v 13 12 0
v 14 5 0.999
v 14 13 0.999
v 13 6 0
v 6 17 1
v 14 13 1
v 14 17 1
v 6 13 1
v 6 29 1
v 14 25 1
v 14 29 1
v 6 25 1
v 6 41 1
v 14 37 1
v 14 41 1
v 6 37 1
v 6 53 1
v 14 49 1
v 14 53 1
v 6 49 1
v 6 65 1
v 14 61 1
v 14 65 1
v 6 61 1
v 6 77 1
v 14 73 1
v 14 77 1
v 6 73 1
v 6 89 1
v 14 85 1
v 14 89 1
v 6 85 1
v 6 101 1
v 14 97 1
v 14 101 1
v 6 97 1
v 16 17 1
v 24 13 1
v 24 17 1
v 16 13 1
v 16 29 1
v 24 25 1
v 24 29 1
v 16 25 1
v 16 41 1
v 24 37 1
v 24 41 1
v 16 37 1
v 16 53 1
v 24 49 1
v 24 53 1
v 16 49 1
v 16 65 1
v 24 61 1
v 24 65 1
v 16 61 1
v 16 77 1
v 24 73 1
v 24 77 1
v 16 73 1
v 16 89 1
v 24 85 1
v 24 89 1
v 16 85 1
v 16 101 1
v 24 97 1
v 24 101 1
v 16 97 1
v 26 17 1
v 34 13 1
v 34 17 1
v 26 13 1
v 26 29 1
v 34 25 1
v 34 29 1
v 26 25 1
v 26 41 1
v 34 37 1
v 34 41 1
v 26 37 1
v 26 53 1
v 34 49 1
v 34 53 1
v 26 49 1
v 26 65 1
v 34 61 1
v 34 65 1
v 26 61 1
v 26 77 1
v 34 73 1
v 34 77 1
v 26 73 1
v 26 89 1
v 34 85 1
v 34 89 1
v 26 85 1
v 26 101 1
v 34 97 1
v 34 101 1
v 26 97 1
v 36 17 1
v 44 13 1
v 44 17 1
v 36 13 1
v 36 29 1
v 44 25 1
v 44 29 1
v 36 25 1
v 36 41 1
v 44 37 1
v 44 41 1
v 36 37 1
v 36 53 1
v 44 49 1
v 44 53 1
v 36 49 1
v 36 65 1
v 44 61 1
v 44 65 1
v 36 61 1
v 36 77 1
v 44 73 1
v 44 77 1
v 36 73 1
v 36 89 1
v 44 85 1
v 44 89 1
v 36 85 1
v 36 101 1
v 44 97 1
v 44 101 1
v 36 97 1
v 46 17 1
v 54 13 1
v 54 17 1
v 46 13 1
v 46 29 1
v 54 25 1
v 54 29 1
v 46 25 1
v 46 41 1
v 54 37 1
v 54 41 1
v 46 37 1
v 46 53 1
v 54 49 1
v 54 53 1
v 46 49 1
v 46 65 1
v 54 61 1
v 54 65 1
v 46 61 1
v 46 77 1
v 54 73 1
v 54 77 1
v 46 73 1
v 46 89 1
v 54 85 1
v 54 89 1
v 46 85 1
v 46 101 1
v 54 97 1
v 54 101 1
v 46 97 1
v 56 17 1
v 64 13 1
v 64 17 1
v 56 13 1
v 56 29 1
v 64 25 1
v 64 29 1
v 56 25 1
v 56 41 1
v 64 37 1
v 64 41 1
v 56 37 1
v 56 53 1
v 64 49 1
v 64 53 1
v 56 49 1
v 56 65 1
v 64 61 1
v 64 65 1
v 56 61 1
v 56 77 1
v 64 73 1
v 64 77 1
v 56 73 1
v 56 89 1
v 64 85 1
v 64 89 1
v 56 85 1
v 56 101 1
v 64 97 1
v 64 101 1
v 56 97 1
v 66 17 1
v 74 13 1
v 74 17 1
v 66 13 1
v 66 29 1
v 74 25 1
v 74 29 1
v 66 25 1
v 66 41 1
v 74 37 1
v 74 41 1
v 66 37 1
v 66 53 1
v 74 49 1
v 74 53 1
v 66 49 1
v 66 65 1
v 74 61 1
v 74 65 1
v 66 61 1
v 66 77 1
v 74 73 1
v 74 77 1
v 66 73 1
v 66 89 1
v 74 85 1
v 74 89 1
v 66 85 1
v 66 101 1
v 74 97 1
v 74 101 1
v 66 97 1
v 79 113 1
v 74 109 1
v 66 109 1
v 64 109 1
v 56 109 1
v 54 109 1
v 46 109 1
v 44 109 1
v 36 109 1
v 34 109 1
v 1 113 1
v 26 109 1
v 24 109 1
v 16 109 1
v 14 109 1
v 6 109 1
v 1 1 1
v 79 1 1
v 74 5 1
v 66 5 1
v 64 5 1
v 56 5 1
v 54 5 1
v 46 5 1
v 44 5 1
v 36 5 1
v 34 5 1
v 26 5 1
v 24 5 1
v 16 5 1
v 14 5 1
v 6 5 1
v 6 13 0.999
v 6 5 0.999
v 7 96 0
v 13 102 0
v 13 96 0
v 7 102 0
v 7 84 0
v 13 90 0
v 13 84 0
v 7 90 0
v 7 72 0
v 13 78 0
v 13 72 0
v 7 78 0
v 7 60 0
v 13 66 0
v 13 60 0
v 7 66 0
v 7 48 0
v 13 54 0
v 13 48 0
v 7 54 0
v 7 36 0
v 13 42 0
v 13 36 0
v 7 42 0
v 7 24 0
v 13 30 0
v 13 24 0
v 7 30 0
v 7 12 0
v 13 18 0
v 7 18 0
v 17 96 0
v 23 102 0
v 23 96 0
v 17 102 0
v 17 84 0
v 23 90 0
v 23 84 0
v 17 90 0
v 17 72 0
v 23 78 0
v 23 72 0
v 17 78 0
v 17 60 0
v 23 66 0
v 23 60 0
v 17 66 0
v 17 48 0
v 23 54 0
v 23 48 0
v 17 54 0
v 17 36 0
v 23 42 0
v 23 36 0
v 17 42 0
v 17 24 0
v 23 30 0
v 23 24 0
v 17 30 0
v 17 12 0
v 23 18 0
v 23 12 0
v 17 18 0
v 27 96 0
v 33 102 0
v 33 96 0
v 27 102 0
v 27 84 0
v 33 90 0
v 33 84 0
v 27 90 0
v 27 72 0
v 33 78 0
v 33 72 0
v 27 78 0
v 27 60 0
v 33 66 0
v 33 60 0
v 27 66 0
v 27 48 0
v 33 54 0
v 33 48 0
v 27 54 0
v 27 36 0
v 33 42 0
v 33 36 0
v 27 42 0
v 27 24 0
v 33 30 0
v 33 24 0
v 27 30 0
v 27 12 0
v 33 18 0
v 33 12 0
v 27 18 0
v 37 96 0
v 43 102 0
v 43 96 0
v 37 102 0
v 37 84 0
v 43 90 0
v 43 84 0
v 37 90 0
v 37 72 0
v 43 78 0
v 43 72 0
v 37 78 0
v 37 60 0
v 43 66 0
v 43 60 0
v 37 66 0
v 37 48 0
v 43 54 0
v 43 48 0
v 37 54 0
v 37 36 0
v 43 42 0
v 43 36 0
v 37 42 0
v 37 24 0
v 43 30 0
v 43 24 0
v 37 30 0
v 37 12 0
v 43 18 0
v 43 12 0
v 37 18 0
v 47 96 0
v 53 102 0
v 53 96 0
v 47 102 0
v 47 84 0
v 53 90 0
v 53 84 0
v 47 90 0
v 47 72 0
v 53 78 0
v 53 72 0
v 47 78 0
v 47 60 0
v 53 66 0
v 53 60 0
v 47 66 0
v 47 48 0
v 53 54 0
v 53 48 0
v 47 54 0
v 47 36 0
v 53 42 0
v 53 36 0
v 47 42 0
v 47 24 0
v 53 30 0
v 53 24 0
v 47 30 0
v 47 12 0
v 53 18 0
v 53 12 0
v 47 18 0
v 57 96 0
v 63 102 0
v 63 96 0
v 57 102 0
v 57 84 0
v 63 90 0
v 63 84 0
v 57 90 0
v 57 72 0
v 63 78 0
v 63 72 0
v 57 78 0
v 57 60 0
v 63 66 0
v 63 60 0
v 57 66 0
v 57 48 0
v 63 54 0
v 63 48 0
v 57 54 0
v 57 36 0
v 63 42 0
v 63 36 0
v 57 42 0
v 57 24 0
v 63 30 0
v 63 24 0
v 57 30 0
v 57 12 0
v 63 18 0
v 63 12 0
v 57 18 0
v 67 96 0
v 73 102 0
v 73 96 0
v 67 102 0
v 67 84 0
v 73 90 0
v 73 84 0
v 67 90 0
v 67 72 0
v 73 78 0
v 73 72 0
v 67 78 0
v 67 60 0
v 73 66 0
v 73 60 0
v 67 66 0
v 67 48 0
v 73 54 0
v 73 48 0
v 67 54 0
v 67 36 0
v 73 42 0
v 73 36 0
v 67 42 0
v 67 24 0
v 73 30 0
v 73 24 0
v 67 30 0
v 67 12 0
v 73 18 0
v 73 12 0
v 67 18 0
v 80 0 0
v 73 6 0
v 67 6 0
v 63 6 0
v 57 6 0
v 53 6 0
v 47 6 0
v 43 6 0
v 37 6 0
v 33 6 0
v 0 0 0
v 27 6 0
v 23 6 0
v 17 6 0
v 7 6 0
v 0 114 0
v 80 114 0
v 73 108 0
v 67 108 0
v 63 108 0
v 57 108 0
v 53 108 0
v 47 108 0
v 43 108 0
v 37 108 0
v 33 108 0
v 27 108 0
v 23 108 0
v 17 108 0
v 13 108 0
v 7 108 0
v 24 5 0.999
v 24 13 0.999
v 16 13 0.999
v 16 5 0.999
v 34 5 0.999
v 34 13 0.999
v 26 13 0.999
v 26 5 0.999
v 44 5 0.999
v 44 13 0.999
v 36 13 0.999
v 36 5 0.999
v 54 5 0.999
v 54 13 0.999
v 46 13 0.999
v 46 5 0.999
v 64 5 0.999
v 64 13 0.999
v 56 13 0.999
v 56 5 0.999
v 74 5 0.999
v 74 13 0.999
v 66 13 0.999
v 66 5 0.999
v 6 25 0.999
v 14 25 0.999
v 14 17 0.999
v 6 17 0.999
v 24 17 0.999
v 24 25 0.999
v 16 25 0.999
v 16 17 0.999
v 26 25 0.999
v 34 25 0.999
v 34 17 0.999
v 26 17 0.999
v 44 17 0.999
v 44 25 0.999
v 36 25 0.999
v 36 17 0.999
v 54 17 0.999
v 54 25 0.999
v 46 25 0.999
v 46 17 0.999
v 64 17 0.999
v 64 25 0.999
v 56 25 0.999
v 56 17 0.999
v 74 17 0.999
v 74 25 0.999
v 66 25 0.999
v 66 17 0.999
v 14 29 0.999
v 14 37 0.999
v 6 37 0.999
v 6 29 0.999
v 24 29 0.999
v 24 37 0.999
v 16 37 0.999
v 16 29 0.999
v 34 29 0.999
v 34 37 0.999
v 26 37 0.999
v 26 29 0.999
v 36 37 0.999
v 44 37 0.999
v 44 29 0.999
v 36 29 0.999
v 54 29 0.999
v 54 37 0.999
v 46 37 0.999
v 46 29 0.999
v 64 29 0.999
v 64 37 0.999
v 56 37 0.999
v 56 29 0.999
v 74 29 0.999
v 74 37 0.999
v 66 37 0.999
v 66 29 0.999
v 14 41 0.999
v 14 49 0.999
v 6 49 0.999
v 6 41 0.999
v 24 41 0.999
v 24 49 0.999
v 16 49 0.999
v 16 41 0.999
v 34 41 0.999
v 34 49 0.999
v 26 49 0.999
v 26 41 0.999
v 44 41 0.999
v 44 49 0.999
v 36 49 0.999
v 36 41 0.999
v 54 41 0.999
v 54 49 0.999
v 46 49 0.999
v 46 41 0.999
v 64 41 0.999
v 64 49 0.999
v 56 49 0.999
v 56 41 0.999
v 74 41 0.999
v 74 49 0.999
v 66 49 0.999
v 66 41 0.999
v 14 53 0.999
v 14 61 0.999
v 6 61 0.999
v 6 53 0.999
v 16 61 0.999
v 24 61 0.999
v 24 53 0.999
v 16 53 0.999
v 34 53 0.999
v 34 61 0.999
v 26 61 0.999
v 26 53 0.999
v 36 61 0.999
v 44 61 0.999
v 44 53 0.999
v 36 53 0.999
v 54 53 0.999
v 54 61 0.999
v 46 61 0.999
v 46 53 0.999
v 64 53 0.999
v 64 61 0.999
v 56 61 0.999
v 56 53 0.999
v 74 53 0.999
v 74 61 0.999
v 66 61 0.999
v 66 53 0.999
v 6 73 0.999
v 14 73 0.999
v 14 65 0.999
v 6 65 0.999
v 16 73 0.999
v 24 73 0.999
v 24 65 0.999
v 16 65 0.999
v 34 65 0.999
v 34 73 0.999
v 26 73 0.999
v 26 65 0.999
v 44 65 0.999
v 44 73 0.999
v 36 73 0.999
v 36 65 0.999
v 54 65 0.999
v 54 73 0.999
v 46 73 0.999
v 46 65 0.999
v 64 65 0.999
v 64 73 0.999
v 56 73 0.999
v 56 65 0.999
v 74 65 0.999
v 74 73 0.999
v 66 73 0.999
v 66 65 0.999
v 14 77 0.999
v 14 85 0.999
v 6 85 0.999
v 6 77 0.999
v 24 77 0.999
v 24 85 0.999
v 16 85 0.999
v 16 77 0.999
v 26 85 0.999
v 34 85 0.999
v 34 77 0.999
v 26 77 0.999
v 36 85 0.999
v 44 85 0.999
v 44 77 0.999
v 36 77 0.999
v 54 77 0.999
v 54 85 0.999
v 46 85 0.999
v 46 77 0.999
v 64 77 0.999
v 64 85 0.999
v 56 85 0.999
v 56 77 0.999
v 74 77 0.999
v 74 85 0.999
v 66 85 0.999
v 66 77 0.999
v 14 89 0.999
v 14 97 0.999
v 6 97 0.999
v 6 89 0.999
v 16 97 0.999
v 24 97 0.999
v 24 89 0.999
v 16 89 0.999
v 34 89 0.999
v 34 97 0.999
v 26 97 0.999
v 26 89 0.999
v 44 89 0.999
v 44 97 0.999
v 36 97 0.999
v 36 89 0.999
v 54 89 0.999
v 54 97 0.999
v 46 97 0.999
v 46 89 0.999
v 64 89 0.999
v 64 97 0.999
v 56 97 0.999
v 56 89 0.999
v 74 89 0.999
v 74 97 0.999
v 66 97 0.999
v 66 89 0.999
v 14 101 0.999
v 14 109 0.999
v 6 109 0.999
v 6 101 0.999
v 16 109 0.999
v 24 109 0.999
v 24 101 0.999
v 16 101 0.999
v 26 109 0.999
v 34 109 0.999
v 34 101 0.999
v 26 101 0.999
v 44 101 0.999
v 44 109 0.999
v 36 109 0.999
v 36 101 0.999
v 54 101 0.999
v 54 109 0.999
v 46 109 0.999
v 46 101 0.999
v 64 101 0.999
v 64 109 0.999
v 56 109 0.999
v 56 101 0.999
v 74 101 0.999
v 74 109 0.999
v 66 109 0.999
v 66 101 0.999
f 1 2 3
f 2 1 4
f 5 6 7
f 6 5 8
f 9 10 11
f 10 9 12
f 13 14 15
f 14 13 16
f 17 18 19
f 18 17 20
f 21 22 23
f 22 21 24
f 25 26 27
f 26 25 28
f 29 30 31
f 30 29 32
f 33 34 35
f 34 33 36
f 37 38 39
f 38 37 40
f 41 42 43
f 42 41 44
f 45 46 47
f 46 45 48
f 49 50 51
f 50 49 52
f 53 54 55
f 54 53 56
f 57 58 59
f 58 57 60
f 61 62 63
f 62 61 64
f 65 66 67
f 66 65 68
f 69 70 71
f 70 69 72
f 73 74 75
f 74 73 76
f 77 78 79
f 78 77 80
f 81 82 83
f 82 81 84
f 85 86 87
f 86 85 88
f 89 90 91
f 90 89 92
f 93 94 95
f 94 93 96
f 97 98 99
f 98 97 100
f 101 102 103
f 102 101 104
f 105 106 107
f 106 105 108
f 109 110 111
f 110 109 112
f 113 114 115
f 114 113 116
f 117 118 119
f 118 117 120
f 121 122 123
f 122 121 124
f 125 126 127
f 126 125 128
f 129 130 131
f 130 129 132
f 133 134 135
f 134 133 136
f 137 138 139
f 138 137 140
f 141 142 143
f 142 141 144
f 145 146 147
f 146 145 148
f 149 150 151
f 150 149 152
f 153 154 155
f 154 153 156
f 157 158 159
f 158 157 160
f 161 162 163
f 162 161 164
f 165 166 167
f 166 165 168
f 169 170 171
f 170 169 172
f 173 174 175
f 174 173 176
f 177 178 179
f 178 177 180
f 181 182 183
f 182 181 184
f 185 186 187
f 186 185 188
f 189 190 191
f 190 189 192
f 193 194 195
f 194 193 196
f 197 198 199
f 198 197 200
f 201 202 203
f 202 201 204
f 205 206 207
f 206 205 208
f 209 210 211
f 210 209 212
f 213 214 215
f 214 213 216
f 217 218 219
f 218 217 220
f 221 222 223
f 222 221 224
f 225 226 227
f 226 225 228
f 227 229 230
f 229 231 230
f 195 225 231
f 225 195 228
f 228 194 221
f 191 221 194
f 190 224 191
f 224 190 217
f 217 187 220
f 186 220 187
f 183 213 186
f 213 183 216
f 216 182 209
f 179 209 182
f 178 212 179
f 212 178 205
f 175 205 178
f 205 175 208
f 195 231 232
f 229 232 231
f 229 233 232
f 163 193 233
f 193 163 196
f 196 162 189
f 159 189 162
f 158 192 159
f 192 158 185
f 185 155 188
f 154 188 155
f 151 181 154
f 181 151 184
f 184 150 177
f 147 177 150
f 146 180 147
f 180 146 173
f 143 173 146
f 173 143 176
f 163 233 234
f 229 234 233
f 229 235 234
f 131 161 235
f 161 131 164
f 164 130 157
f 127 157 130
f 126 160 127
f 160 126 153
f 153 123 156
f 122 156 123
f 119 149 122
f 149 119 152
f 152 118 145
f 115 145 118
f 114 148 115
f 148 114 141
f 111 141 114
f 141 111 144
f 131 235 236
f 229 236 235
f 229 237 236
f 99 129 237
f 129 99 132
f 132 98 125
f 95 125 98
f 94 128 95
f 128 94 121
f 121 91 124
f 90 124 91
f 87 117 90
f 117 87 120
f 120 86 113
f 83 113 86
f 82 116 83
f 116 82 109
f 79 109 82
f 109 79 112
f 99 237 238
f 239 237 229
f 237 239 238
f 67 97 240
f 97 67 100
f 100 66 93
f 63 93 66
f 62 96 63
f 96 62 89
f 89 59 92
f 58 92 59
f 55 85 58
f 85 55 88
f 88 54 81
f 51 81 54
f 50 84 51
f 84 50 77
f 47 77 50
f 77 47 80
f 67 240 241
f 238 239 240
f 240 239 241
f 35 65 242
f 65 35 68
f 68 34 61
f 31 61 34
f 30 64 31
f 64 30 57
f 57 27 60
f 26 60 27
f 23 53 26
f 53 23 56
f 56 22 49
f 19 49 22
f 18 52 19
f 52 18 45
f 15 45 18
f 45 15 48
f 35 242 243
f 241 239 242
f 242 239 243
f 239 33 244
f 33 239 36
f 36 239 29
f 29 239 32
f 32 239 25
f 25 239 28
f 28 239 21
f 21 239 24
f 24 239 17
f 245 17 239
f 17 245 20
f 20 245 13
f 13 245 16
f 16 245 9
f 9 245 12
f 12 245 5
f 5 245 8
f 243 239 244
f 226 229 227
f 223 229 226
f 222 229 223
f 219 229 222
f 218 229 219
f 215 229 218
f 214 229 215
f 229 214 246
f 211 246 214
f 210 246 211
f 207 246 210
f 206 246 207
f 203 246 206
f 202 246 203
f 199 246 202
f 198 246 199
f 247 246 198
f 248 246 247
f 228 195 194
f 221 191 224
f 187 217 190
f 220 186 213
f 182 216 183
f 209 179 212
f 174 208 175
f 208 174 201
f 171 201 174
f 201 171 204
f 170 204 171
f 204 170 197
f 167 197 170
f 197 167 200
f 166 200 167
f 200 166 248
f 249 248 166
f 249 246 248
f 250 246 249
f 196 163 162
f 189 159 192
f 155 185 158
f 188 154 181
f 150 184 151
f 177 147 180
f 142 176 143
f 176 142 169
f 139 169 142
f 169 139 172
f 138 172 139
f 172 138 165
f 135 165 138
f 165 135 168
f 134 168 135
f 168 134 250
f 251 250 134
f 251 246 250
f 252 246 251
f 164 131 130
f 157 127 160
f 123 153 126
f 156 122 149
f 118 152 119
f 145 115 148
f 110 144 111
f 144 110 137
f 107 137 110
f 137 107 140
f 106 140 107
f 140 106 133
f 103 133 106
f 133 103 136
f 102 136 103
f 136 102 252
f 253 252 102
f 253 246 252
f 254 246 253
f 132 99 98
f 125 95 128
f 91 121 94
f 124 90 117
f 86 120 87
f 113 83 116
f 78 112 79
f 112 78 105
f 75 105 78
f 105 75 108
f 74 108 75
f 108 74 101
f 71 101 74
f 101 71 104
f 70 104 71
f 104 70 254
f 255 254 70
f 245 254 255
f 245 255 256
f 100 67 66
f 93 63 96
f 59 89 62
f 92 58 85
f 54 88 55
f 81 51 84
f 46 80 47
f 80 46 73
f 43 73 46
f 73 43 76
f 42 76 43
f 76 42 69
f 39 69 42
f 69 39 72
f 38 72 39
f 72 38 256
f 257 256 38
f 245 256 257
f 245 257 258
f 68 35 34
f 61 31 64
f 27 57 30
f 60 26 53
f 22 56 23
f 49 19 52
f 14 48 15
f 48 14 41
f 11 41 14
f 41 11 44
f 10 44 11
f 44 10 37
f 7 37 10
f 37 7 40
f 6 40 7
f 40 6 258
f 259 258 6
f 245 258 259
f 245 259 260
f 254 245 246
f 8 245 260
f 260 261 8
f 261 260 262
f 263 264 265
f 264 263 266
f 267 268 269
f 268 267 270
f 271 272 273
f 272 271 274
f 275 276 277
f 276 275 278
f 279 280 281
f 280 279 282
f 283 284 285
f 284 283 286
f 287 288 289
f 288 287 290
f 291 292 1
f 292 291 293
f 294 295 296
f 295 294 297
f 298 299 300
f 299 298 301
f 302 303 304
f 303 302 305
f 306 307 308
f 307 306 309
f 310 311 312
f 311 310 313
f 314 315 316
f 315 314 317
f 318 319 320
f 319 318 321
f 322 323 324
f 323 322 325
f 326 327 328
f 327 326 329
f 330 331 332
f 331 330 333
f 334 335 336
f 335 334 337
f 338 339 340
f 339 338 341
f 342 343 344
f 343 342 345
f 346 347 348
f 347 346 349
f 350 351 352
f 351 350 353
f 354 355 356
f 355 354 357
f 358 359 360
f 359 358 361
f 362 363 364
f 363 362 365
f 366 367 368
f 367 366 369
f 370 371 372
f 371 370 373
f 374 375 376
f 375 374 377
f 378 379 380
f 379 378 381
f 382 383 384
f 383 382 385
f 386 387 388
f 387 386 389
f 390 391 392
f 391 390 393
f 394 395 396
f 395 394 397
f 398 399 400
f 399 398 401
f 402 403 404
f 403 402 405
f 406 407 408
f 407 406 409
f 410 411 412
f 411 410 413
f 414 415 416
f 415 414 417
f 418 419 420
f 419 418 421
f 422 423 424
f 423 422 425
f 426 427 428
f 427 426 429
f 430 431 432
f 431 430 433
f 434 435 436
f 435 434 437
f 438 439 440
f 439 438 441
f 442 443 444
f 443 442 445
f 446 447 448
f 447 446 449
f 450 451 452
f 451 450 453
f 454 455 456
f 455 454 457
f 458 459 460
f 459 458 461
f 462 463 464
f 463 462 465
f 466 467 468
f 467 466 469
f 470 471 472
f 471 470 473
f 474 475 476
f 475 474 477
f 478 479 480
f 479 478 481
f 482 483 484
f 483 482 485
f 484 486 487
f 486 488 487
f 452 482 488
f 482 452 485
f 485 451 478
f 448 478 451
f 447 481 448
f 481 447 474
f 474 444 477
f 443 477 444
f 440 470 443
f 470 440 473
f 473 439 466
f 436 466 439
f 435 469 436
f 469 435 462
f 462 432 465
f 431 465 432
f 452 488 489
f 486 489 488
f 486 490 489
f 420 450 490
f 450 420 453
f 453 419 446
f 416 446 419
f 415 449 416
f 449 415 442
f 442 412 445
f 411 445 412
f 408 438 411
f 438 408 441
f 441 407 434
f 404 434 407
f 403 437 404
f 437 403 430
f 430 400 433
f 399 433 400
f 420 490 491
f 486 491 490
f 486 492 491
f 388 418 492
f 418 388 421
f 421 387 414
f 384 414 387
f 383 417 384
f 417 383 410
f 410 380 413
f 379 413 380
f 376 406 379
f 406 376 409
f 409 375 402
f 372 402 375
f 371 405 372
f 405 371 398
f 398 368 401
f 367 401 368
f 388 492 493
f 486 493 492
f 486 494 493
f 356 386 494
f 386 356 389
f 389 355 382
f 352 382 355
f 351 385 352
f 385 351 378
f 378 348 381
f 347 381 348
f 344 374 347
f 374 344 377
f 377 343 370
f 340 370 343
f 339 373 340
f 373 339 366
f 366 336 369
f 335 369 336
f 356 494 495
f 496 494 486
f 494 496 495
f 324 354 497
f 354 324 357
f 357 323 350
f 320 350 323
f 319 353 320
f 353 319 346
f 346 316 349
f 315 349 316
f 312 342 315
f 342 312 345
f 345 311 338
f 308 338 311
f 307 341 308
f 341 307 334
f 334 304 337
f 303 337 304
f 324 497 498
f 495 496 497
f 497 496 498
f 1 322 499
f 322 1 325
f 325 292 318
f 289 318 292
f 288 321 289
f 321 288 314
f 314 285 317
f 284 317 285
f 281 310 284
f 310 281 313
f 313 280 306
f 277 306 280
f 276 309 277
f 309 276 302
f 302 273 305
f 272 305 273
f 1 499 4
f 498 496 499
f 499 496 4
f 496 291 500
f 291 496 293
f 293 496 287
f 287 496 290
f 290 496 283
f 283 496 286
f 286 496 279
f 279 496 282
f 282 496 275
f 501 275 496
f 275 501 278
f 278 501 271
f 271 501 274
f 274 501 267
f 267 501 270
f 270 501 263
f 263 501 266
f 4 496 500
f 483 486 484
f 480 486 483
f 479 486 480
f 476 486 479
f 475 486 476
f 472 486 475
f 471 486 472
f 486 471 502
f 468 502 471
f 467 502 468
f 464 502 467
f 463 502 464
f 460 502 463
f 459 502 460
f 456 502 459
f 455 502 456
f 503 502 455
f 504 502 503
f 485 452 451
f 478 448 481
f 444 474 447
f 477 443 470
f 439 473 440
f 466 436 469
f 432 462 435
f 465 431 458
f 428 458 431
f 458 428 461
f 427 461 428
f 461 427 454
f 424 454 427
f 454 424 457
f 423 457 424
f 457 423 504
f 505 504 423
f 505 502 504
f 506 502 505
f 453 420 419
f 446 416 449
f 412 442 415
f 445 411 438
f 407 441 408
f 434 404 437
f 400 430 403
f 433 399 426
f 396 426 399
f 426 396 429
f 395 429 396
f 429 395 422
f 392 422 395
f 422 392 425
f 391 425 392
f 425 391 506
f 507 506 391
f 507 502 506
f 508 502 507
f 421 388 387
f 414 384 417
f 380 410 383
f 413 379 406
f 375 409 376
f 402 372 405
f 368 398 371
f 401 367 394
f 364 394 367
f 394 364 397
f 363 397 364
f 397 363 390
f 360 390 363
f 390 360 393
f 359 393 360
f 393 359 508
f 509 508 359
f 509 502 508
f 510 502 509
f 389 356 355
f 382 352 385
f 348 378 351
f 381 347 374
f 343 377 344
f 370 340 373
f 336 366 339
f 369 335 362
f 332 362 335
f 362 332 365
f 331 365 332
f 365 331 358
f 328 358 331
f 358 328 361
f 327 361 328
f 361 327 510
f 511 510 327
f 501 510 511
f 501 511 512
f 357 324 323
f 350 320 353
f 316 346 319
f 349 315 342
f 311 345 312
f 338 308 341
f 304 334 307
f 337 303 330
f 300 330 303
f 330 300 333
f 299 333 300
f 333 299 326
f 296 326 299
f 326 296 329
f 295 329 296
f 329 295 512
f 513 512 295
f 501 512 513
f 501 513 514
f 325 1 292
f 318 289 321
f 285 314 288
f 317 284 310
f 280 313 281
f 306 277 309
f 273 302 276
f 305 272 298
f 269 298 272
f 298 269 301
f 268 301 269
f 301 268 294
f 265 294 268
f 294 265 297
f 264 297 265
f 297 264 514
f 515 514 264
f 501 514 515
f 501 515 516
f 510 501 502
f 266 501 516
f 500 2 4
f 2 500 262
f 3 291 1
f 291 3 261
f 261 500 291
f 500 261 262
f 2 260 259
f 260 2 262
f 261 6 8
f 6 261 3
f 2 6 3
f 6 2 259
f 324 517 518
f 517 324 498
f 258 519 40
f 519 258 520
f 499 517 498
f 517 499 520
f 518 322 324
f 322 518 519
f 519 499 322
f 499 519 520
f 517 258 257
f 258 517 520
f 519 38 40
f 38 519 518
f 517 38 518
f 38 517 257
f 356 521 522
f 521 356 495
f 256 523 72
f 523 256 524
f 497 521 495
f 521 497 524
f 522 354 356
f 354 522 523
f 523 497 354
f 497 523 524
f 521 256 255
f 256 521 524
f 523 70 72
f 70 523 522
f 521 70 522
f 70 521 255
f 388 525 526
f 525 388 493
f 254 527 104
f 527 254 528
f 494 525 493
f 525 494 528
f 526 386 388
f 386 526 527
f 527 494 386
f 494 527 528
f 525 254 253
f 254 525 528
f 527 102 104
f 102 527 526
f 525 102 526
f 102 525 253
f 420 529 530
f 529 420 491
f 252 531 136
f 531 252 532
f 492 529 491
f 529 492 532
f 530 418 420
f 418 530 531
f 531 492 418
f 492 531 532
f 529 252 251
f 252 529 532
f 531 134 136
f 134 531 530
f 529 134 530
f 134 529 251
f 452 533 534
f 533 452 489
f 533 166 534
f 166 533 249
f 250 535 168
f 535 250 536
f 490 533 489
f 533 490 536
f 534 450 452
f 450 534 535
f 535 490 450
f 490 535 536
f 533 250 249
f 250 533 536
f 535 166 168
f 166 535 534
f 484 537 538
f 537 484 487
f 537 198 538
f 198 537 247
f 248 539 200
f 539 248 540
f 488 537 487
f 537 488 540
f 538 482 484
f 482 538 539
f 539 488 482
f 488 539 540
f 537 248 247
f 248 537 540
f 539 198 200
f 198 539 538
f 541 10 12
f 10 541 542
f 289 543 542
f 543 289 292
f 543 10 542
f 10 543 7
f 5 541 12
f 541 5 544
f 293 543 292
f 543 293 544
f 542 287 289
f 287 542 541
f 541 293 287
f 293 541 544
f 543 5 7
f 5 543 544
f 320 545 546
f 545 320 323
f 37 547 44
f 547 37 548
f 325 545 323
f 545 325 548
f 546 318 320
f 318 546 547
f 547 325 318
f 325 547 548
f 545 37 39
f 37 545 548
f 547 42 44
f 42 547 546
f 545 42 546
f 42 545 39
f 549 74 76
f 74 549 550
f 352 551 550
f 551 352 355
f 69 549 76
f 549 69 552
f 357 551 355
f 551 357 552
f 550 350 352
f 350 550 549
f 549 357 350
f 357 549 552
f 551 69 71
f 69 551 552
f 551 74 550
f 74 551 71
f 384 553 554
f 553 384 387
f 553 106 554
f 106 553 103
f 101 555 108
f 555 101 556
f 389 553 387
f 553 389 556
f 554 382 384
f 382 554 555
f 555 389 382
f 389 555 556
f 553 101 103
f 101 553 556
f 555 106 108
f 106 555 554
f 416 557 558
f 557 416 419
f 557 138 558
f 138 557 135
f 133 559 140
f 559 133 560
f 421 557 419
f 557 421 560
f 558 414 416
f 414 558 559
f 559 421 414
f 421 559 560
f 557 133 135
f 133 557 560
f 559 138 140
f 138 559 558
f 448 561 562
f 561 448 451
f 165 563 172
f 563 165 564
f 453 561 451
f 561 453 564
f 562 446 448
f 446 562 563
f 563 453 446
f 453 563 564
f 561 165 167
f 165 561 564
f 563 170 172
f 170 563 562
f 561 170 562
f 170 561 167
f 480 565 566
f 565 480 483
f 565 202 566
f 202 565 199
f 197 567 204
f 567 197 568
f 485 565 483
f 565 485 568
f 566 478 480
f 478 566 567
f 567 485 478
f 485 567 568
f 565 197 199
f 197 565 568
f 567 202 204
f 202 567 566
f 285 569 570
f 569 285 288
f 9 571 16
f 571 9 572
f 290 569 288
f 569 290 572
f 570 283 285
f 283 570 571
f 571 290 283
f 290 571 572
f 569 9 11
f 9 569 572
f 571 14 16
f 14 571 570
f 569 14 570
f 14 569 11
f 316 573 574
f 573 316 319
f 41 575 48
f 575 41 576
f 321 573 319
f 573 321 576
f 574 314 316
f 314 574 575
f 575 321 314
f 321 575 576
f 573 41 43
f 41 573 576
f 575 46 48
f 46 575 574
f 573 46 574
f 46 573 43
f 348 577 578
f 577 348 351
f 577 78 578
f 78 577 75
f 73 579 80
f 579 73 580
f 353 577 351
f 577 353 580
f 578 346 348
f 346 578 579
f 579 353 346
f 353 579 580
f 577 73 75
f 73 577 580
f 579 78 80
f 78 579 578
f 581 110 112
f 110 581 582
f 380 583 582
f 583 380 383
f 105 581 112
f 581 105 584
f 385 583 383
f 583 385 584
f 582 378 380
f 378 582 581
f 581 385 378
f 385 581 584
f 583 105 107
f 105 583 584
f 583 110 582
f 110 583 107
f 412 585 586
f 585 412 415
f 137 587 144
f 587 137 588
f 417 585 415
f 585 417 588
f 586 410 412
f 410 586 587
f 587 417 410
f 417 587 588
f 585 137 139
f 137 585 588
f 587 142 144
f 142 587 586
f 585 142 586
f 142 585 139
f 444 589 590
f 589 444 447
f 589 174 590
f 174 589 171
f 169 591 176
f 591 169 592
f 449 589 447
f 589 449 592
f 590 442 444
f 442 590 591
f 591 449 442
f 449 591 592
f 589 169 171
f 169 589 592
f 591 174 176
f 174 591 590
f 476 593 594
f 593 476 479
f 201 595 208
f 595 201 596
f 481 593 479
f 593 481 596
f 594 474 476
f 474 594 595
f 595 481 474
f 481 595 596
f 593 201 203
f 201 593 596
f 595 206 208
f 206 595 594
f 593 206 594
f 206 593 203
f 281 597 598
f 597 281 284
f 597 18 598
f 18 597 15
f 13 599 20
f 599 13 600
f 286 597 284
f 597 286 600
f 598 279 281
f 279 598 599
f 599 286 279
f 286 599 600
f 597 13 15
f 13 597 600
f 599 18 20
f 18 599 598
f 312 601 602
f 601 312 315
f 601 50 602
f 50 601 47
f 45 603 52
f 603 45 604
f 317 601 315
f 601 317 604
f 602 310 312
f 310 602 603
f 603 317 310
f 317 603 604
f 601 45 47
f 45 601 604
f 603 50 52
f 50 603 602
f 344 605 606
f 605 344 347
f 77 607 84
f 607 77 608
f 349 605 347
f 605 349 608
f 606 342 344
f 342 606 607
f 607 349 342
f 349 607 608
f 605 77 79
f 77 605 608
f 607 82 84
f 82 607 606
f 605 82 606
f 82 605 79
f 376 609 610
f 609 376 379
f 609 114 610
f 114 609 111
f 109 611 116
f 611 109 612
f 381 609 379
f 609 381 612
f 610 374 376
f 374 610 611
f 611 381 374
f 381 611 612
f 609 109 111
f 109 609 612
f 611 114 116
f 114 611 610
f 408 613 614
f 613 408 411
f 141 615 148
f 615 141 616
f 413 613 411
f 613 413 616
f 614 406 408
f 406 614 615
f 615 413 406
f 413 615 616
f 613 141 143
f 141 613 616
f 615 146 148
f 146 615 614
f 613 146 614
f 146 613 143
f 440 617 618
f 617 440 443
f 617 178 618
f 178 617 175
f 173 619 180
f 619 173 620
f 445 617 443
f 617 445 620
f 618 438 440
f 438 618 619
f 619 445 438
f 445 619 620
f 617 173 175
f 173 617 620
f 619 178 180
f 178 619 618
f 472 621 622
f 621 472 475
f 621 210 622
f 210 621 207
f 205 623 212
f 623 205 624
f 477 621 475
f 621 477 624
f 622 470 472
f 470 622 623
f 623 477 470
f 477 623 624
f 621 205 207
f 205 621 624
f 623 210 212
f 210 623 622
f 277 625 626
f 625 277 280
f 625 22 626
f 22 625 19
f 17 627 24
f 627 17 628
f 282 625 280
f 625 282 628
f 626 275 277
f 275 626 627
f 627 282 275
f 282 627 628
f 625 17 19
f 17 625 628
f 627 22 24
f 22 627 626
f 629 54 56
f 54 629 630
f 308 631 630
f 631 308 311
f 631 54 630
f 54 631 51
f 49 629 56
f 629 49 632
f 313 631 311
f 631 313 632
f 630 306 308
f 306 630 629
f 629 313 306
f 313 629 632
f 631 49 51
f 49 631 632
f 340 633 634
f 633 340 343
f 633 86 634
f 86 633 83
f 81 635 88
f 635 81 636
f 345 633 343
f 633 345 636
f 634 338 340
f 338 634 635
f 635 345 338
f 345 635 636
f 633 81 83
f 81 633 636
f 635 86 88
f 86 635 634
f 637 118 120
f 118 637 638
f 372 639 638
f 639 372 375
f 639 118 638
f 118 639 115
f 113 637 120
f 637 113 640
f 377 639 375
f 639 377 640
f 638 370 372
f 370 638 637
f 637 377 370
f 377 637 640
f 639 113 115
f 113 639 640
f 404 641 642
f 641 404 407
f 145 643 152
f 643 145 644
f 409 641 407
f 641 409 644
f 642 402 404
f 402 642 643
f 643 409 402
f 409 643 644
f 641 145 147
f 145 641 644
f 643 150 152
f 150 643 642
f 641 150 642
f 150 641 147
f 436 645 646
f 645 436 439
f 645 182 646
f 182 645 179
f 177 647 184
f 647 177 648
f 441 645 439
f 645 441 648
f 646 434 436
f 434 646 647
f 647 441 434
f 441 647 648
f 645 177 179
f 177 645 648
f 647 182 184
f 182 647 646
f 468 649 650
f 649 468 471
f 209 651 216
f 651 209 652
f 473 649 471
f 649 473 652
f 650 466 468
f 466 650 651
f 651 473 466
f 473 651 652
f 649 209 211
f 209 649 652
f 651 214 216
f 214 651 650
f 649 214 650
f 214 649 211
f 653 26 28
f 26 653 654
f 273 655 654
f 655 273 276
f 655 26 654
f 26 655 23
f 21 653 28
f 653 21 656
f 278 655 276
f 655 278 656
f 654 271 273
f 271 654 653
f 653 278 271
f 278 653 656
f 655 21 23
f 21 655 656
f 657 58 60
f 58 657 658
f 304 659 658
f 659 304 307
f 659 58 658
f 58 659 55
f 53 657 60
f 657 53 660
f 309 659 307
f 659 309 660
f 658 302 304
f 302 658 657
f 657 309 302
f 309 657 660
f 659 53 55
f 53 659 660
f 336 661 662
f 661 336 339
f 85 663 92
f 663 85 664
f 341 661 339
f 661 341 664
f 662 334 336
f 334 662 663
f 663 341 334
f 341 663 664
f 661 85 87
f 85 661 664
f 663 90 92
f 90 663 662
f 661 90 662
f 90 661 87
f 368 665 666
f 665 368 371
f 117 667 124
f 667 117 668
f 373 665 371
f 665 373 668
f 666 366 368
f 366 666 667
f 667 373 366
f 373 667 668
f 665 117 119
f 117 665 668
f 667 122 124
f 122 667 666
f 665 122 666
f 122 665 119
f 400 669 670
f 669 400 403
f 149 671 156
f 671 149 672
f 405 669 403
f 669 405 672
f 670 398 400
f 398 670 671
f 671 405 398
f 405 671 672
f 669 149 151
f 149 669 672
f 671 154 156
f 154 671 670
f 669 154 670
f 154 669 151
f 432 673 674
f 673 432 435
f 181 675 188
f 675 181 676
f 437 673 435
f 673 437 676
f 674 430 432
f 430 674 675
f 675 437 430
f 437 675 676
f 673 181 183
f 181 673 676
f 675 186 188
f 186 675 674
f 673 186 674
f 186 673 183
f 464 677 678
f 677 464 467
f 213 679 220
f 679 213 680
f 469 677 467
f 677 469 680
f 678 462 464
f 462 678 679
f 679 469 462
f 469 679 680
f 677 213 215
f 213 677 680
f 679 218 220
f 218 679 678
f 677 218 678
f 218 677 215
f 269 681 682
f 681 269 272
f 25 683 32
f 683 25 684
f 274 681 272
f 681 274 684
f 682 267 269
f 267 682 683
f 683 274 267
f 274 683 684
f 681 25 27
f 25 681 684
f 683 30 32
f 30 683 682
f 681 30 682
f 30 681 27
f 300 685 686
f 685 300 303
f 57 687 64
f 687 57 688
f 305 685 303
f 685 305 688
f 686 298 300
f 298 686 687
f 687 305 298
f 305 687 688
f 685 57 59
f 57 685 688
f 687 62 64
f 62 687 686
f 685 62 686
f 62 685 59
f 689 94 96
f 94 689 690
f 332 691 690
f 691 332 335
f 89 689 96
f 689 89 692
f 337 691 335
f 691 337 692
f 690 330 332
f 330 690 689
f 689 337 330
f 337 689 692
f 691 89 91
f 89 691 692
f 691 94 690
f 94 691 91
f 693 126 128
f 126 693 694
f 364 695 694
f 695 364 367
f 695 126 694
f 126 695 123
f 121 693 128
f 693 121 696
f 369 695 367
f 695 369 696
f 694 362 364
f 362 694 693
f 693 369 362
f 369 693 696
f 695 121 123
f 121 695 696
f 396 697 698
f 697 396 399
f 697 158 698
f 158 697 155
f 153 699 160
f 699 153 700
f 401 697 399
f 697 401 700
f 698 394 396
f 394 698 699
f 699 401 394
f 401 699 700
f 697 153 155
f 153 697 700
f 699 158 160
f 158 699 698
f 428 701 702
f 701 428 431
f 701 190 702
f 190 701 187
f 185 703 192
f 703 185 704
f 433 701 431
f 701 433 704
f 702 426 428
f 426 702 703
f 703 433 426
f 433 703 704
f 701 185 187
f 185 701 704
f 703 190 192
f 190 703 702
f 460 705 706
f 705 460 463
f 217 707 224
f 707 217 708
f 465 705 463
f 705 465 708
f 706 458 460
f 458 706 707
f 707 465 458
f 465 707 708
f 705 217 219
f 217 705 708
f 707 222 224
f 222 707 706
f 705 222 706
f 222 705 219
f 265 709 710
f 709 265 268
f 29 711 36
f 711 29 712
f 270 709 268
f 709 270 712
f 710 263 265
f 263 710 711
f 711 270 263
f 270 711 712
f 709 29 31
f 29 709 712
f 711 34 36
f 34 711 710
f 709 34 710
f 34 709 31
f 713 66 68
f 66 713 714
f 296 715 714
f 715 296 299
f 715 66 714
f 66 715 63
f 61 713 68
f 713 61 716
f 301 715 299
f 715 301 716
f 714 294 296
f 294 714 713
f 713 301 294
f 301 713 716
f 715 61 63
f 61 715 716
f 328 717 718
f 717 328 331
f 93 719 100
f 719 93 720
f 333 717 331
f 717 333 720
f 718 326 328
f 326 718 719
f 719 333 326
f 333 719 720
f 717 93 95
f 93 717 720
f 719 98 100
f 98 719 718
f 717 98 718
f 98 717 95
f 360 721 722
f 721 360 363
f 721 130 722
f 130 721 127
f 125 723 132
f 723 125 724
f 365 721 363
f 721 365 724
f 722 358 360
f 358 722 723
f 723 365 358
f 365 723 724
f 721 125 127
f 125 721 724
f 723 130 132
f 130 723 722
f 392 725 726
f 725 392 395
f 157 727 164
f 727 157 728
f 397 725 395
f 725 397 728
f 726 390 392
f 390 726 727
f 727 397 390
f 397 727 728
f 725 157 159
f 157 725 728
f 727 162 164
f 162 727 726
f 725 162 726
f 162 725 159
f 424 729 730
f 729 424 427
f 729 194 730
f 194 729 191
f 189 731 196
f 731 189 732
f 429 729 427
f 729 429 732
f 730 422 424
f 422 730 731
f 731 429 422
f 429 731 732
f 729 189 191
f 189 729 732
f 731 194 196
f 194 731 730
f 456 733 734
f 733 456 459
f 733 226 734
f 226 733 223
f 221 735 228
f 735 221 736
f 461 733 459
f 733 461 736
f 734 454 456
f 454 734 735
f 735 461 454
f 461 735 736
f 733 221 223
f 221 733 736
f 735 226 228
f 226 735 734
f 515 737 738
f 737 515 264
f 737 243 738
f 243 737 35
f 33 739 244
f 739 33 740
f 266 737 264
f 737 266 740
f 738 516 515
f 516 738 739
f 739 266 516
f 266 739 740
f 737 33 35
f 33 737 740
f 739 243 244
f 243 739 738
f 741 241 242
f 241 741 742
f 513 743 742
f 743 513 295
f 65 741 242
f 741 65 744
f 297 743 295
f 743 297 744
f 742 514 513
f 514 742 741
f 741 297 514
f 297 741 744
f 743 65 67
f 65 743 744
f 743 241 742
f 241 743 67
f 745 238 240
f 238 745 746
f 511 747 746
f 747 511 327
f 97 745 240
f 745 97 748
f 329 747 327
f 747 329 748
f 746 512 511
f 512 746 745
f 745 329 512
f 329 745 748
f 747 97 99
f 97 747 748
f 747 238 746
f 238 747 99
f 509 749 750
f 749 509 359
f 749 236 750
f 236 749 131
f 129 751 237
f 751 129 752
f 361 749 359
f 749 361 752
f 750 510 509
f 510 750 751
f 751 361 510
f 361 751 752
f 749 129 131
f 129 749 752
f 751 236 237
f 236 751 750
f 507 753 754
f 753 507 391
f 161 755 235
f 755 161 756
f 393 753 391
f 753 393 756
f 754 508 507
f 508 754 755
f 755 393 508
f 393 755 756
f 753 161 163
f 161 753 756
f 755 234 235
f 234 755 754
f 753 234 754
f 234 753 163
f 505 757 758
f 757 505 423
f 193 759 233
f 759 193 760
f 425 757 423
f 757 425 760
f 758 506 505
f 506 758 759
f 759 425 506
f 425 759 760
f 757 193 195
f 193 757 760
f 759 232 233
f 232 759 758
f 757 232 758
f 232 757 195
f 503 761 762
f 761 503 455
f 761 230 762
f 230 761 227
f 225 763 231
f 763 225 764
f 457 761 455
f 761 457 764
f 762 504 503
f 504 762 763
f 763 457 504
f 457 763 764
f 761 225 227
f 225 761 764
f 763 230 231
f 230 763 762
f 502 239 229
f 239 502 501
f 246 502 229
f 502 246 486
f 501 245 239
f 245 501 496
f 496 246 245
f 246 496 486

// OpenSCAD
//
// Project Box
// Copyright (C) 2021 Adiac, Nils Weber
//
// Licensed under CC BY-NC-SA 4.0
//

////////////////////////////////////////////////////////////////////////////////

/* [Stencil Configuration] */

// Height per line on the paper (horizontal space between boxes) and therefore width/height of each checkbox
Line_Height = 6;

// Number of boxes in the vertical (Y) direction
Number_of_boxes_vertical = 9;

// Number of boxes in the horizontal (X) direction
Number_of_boxes_horizontal = 7;

// Space between boxes in the horizontal (X) direction
Horizontal_Space = 10;


/* [Look and Feel] */

// Thickness of the stencil
Stencil_Thickness = 1;

// Width of the slope on all edges
Slope_Size = 2;

/* [Hidden] */

////////////////////////////////////////////////////////////////////////////////

//CALCS
boxSize = Line_Height;
templateHeight = (Number_of_boxes_vertical * 2 + 1) * Line_Height;
templateWidth = (Number_of_boxes_horizontal + 1) * Horizontal_Space;

startX = (Horizontal_Space*2 - boxSize) / 2;
startY = Line_Height;
stepX = Horizontal_Space;
stepY = Line_Height * 2;

difference() {
	slopedCube([templateWidth,templateHeight], [templateWidth-Slope_Size, templateHeight-Slope_Size], Stencil_Thickness);

	for(iY = [0:Number_of_boxes_vertical-1]) {
		currentY = startY + iY * stepY;

		for(iX = [0:Number_of_boxes_horizontal-1]) {
			currentX = startX + iX * stepX;

			#translate([currentX,currentY, 0])
				slopedCube([Line_Height, Line_Height],
				           [Line_Height+Slope_Size,
				           Line_Height+Slope_Size],
				           Stencil_Thickness);
		}
	}
}


function to3d(dim2d, d3=0) = [dim2d[0], dim2d[1], d3];
module slopedCube(size_bottom, size_top, height) {
	cube_size_top = to3d(size_top, 0.001);
	cube_size_bottom = to3d(size_bottom, 0.001);

	translate(to3d(size_bottom)/2)
	hull() {
		translate([0, 0, height])
			cube(cube_size_top, center=true);

		cube(cube_size_bottom, center=true);
	}
}
